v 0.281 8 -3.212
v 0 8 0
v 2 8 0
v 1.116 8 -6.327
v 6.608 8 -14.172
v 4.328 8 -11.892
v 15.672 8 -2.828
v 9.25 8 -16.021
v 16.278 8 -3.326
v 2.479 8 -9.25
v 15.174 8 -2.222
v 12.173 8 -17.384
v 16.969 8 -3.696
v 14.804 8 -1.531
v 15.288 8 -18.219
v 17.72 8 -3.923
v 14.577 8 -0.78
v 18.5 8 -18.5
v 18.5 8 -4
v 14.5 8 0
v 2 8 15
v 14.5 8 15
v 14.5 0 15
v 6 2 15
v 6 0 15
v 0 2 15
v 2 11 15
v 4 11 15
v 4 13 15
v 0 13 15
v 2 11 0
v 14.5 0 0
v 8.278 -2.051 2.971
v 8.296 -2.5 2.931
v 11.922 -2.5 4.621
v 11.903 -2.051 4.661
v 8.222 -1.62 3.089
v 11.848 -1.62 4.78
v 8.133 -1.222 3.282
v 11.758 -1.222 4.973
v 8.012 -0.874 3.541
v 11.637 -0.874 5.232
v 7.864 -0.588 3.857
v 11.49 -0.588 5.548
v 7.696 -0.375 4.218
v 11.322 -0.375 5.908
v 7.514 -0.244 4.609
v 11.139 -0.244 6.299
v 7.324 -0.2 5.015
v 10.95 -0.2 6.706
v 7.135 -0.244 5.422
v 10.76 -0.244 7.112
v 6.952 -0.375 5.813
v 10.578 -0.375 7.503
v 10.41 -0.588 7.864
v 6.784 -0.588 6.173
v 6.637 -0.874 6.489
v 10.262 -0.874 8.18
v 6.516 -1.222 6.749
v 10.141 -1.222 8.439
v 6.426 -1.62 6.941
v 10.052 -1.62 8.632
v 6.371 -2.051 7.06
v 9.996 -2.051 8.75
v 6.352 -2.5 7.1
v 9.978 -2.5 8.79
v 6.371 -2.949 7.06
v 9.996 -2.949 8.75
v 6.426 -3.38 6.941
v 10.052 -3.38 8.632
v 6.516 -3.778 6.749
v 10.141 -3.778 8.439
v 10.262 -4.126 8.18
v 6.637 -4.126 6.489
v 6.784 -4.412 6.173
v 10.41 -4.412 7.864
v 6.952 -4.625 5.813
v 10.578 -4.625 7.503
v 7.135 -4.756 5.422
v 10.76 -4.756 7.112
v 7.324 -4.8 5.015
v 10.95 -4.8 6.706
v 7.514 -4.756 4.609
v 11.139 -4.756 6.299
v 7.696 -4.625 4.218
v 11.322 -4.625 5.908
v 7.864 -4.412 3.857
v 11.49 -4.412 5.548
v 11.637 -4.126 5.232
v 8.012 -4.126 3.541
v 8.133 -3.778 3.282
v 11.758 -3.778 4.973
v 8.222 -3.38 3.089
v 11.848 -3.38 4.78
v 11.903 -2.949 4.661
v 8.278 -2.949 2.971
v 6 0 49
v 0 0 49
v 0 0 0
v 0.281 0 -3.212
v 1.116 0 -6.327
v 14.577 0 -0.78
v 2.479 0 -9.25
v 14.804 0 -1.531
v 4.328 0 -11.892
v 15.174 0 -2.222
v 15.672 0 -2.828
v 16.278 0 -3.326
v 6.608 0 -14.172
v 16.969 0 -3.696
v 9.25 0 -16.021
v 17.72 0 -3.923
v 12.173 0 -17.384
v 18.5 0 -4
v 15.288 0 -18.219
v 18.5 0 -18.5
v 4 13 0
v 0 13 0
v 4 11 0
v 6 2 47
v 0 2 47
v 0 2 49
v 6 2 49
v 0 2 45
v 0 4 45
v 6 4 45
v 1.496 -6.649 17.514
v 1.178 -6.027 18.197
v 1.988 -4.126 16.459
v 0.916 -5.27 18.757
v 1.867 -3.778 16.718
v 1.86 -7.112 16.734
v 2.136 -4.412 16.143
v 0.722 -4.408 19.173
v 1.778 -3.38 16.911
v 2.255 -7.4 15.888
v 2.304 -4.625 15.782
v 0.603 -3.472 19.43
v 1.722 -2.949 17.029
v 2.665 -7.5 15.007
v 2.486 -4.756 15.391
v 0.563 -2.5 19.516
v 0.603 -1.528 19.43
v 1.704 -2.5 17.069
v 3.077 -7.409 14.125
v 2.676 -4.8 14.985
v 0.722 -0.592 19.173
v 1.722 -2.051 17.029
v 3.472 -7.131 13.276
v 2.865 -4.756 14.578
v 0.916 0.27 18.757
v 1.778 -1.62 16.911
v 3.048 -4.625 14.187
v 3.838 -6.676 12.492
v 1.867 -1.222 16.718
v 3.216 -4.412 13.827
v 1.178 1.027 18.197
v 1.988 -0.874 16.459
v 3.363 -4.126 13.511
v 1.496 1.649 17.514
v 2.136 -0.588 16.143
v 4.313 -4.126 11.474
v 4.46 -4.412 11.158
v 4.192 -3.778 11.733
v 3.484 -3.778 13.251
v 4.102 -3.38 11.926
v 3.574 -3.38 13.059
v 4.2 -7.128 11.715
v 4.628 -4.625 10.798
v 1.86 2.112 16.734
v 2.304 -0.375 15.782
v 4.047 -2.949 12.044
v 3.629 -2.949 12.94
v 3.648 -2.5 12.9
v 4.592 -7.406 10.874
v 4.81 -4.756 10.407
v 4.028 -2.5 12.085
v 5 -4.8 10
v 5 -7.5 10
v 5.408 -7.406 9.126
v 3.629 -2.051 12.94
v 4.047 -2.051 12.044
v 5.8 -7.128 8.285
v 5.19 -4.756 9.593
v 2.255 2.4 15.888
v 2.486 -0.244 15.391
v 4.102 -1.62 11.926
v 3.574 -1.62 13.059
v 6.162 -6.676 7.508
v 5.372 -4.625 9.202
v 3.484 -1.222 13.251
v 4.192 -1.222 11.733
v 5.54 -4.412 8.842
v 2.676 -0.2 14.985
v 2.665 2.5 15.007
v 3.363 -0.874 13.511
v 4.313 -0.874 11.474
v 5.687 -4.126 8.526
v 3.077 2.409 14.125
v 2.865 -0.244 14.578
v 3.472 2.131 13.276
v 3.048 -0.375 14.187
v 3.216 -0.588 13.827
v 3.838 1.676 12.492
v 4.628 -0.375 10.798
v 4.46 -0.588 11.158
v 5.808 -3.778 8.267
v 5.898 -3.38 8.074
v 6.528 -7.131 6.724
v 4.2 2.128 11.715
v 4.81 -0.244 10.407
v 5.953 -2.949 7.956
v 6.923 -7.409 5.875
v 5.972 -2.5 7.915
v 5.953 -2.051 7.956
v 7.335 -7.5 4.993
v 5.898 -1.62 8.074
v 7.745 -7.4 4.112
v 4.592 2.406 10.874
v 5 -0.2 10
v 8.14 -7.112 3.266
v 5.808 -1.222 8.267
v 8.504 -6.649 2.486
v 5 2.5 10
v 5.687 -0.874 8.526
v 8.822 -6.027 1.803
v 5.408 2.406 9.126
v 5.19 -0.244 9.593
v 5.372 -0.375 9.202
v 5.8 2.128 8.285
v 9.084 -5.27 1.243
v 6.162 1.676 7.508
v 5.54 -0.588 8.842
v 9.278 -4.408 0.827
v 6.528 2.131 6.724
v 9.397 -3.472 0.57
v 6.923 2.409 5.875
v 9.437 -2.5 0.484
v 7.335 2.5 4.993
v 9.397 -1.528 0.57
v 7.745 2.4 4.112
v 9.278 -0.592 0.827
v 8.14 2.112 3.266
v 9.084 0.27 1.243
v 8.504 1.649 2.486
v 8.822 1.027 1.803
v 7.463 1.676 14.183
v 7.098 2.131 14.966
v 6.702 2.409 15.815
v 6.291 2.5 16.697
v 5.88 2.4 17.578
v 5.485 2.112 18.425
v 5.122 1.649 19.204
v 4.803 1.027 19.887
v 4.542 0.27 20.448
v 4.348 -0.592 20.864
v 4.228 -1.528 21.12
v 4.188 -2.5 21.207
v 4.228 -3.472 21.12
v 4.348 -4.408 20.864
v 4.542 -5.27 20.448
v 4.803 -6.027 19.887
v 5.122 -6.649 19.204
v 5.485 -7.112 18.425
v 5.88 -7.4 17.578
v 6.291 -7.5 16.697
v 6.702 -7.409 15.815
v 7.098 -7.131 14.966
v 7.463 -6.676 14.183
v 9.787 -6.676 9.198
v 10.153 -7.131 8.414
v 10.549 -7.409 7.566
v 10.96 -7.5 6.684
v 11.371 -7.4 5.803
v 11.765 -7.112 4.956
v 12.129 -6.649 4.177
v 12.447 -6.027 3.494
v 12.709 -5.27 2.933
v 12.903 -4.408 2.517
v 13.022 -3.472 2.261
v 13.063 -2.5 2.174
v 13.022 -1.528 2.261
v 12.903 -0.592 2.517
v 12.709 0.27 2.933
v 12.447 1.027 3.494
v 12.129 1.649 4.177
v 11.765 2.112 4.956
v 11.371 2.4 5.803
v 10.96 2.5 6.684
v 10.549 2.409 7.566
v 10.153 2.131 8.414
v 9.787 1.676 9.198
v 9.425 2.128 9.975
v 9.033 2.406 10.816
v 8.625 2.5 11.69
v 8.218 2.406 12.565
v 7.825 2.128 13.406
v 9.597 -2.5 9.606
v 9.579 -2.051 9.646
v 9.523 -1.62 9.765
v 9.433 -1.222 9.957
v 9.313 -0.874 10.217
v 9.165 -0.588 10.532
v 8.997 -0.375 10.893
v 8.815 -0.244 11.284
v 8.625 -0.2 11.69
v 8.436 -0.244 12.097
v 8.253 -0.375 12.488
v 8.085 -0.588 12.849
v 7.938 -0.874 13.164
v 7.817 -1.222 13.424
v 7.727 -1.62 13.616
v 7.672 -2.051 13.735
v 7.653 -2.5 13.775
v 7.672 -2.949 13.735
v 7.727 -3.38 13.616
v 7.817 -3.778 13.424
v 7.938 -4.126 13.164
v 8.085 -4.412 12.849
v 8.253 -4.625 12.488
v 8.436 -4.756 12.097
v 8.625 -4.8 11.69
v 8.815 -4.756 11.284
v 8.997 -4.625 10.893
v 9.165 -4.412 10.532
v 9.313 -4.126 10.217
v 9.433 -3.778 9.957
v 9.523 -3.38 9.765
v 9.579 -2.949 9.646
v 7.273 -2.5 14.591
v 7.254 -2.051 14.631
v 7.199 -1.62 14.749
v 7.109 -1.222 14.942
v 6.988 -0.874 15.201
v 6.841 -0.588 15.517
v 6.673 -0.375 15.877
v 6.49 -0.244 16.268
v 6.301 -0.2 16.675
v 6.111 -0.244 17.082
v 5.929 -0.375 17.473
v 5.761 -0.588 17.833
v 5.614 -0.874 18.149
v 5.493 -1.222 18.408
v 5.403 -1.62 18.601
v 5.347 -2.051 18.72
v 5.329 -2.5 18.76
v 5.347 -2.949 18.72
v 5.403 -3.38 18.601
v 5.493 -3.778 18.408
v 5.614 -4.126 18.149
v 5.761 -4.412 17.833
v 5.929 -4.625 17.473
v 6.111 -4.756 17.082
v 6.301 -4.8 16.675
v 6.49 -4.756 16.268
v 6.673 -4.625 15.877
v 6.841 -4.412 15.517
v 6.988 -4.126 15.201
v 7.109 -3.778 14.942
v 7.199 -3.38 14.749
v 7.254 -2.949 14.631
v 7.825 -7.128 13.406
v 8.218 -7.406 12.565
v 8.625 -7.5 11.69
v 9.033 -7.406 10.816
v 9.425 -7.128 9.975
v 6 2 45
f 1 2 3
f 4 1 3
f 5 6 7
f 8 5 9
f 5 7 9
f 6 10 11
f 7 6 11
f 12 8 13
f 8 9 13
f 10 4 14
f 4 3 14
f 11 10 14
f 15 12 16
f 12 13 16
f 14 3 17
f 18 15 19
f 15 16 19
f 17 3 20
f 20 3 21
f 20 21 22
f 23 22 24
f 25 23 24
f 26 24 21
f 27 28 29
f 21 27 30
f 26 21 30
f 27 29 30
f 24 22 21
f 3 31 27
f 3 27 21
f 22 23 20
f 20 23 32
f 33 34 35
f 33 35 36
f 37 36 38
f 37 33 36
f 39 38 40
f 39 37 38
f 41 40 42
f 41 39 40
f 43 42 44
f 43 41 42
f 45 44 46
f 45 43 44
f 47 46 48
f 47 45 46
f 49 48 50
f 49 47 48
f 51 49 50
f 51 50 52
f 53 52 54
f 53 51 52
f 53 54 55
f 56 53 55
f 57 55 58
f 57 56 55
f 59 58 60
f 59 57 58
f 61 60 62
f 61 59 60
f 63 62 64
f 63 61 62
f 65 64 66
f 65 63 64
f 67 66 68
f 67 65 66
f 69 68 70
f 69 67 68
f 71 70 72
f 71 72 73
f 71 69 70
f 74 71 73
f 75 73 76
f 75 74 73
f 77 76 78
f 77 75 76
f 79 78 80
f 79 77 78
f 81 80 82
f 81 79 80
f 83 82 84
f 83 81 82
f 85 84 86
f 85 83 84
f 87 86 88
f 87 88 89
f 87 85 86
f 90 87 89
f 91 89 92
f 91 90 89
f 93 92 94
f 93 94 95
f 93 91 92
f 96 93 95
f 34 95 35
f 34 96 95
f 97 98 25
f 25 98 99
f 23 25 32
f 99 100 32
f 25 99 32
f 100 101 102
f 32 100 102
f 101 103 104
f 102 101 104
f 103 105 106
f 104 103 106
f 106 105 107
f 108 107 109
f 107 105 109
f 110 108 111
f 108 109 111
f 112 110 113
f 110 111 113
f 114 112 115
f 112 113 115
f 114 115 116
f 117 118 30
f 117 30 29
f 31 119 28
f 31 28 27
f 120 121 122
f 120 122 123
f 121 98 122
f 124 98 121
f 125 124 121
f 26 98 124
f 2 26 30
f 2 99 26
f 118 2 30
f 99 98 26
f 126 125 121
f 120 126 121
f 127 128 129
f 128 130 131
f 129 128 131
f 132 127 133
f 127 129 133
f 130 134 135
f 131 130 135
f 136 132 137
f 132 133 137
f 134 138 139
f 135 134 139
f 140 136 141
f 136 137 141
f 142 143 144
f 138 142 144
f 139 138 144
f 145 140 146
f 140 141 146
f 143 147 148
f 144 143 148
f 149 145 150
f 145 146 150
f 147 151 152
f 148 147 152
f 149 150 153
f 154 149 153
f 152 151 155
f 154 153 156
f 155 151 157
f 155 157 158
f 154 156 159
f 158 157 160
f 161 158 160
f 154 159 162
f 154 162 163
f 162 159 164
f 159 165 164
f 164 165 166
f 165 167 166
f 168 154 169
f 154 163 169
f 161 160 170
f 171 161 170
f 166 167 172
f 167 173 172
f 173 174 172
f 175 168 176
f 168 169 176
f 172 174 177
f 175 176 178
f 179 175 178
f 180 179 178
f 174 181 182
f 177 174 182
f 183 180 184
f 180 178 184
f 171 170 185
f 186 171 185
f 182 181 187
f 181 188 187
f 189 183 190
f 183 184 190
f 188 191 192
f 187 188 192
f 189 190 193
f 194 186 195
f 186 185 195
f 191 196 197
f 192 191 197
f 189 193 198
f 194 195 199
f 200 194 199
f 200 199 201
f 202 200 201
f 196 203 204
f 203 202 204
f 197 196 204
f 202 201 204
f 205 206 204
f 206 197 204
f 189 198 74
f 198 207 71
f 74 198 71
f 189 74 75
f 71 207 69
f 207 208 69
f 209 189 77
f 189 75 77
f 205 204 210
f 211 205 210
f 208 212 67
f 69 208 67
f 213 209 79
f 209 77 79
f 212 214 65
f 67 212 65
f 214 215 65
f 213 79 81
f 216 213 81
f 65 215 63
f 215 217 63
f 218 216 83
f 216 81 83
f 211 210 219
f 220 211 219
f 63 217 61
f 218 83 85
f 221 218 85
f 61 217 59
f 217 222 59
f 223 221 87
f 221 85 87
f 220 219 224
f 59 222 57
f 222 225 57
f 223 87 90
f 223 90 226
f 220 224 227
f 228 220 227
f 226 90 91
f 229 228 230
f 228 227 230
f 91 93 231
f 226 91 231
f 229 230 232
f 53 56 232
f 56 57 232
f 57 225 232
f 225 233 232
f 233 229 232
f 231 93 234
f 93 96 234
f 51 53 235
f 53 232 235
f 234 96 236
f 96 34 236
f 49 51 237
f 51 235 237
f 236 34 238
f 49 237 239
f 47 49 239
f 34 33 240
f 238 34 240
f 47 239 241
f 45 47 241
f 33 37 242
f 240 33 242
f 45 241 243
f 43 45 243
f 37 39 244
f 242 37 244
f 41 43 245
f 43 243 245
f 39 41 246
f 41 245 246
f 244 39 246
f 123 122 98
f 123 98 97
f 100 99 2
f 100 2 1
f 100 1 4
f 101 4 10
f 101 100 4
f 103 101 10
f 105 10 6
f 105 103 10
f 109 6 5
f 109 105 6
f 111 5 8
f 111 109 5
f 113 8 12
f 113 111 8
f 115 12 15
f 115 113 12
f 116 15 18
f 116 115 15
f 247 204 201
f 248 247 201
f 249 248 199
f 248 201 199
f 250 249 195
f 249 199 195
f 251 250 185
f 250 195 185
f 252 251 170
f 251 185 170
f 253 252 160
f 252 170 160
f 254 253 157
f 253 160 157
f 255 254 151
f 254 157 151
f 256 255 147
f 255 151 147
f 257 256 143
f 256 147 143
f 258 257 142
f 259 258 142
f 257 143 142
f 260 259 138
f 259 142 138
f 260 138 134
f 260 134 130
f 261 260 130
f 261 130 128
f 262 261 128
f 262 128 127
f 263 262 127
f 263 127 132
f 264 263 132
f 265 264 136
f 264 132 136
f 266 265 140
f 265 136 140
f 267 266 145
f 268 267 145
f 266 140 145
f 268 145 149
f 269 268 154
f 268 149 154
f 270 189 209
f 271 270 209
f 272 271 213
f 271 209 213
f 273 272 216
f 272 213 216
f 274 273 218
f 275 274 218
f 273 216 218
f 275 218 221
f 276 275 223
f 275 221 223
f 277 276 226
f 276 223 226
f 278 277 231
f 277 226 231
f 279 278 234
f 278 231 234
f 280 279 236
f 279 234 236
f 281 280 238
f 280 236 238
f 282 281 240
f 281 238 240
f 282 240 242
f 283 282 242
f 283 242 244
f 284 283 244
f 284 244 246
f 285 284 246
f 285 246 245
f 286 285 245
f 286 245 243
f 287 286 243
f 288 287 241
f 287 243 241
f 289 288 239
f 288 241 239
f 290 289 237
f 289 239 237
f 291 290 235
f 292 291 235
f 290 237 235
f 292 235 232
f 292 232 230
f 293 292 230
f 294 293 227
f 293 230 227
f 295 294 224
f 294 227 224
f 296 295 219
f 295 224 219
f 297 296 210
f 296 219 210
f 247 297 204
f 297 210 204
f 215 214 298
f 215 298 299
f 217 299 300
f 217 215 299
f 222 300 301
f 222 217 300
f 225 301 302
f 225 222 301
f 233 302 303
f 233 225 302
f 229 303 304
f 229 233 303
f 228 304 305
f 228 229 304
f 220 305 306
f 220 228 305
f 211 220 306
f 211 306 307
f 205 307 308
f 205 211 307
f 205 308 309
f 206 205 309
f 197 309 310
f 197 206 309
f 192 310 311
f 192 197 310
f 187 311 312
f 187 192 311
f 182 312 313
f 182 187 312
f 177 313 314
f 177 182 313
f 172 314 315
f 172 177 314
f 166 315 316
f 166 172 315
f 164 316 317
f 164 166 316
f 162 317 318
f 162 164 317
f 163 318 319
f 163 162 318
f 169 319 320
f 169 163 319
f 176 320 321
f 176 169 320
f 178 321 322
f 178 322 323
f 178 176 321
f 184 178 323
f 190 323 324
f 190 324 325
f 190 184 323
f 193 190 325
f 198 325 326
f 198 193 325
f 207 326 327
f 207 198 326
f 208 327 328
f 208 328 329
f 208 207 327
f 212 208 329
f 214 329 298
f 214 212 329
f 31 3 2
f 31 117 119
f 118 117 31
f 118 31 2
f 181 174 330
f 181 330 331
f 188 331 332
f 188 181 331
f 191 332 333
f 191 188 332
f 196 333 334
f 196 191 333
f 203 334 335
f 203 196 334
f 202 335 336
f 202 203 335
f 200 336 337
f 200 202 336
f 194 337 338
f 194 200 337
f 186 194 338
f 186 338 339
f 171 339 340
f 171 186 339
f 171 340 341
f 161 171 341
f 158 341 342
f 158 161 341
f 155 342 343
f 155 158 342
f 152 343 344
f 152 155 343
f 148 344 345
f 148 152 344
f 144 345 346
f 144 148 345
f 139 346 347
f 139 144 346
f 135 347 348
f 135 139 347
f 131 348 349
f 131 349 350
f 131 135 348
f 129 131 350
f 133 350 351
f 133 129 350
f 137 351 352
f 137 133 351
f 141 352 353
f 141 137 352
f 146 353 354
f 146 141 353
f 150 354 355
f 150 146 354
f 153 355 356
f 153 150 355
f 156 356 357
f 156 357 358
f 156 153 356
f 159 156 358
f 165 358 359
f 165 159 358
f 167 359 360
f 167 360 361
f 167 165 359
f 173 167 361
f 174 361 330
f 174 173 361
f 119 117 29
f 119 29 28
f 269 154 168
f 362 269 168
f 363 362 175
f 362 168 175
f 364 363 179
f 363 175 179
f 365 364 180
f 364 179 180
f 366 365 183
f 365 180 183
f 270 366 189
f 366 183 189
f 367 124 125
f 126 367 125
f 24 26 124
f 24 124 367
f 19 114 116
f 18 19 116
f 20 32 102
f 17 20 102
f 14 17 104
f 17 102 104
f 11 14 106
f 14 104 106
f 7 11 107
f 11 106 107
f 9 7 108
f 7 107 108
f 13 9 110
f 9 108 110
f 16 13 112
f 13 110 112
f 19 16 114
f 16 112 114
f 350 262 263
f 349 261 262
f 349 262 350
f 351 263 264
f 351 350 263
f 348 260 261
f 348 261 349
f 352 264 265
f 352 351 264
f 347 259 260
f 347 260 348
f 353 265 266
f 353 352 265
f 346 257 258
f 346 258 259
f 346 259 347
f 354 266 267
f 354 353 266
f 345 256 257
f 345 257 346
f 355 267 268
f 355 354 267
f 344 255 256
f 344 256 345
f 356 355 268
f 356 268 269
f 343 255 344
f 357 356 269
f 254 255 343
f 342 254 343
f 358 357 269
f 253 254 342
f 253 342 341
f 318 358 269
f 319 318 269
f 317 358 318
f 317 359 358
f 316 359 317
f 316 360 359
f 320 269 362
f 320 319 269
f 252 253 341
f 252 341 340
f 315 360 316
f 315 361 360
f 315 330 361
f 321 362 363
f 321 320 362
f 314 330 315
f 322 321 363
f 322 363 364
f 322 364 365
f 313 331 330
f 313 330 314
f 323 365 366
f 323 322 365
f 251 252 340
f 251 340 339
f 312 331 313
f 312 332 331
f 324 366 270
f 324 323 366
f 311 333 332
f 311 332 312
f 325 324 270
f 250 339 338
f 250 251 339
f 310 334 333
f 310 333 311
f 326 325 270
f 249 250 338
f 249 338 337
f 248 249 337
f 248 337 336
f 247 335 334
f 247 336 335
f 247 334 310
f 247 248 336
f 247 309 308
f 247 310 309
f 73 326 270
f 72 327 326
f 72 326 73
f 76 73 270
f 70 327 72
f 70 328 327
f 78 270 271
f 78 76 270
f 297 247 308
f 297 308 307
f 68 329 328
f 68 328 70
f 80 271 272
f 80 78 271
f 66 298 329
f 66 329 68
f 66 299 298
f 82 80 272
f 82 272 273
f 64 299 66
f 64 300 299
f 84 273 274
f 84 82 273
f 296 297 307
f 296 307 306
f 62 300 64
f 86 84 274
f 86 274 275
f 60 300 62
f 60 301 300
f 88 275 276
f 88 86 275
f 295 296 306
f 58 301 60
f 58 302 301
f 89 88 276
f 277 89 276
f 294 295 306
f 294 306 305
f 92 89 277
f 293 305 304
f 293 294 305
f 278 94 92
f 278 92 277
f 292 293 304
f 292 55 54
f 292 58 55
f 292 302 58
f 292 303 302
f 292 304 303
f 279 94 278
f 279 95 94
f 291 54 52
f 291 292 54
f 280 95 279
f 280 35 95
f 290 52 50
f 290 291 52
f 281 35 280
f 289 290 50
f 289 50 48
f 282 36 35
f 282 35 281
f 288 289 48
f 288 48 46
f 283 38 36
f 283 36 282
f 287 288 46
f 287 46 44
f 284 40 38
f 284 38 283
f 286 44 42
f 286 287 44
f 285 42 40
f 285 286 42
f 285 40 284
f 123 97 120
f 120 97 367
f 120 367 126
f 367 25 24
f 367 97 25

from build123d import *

# Parameters (mm, degrees)
SKETCH002_R  = 2.3
PAD003_DEPTH = 4
PAD_DEPTH    = 15
PAD002_DEPTH = 8
POCKET_DEPTH = 13.001
SKETCH005_W  = 6
SKETCH005_H  = 2
PAD004_DEPTH = 34
PAD005_DEPTH = 6


with BuildPart() as pad003:
    # Sketch002 → Pad003 (new body)
    with BuildSketch(Plane(origin=(5, -2.5, 10), x_dir=(0.422618, 0, -0.906308), z_dir=(0.906308, 0, 0.422618))):
        with BuildLine():
            ThreePointArc((-2.75, 4.175823), (-10.5, 0), (-2.75, -4.175823))
            ThreePointArc((-2.75, -4.175823), (0, -5), (2.75, -4.175823))
            ThreePointArc((2.75, -4.175823), (10.5, 0), (2.75, 4.175823))
            ThreePointArc((2.75, 4.175823), (0, 5), (-2.75, 4.175823))
        make_face()
        with Locations((-5.5, 0)):
            Circle(SKETCH002_R, mode=Mode.SUBTRACT)
        Circle(SKETCH002_R, mode=Mode.SUBTRACT)
        with Locations((5.5, 0)):
            Circle(SKETCH002_R, mode=Mode.SUBTRACT)
    extrude(amount=PAD003_DEPTH)


with BuildPart() as pad005:
    # Sketch → Pad (new body)
    with BuildSketch(Plane.XY):
        Polygon((2, 8), (18.5, 8), (18.5, 0), (0, 0), (0, 13), (4, 13), (4, 11), (2, 11), align=None)
    extrude(amount=PAD_DEPTH)

    # Sketch001 → Pad002 (new body)
    with BuildSketch(Plane.XZ):
        with BuildLine():
            ThreePointArc((0, 0), (5.418525, -13.081475), (18.5, -18.5))
            Line((18.5, 0), (18.5, -18.5))
            Line((18.5, 0), (0, 0))
        make_face()
    extrude(amount=-PAD002_DEPTH)

    # Sketch004 → Pocket (cut, through all)
    with BuildSketch(Plane.XZ):
        with BuildLine():
            Line((14.5, 20), (18.5, 20))
            Line((18.5, 20), (18.5, -4))
            ThreePointArc((14.5, 1.7e-05), (15.671567, -2.828421), (18.5, -4))
            Line((14.5, 20), (14.5, 1.7e-05))
        make_face()
    extrude(amount=-POCKET_DEPTH, mode=Mode.SUBTRACT)

    # Sketch005 → Pad004 (new body)
    with BuildSketch(Plane.XY.offset(15)):
        with Locations((3, 1)):
            Rectangle(SKETCH005_W, SKETCH005_H)
    extrude(amount=PAD004_DEPTH)

    # Sketch006 → Pad005 (new body)
    with BuildSketch(Plane(origin=(0, 0, 0), x_dir=(0, -1, 0), z_dir=(-1, 0, 0))):
        Polygon((0, 49), (0, 45), (-4, 45), align=None)
    extrude(amount=-PAD005_DEPTH)


solid = Compound([pad003.part, pad005.part])
